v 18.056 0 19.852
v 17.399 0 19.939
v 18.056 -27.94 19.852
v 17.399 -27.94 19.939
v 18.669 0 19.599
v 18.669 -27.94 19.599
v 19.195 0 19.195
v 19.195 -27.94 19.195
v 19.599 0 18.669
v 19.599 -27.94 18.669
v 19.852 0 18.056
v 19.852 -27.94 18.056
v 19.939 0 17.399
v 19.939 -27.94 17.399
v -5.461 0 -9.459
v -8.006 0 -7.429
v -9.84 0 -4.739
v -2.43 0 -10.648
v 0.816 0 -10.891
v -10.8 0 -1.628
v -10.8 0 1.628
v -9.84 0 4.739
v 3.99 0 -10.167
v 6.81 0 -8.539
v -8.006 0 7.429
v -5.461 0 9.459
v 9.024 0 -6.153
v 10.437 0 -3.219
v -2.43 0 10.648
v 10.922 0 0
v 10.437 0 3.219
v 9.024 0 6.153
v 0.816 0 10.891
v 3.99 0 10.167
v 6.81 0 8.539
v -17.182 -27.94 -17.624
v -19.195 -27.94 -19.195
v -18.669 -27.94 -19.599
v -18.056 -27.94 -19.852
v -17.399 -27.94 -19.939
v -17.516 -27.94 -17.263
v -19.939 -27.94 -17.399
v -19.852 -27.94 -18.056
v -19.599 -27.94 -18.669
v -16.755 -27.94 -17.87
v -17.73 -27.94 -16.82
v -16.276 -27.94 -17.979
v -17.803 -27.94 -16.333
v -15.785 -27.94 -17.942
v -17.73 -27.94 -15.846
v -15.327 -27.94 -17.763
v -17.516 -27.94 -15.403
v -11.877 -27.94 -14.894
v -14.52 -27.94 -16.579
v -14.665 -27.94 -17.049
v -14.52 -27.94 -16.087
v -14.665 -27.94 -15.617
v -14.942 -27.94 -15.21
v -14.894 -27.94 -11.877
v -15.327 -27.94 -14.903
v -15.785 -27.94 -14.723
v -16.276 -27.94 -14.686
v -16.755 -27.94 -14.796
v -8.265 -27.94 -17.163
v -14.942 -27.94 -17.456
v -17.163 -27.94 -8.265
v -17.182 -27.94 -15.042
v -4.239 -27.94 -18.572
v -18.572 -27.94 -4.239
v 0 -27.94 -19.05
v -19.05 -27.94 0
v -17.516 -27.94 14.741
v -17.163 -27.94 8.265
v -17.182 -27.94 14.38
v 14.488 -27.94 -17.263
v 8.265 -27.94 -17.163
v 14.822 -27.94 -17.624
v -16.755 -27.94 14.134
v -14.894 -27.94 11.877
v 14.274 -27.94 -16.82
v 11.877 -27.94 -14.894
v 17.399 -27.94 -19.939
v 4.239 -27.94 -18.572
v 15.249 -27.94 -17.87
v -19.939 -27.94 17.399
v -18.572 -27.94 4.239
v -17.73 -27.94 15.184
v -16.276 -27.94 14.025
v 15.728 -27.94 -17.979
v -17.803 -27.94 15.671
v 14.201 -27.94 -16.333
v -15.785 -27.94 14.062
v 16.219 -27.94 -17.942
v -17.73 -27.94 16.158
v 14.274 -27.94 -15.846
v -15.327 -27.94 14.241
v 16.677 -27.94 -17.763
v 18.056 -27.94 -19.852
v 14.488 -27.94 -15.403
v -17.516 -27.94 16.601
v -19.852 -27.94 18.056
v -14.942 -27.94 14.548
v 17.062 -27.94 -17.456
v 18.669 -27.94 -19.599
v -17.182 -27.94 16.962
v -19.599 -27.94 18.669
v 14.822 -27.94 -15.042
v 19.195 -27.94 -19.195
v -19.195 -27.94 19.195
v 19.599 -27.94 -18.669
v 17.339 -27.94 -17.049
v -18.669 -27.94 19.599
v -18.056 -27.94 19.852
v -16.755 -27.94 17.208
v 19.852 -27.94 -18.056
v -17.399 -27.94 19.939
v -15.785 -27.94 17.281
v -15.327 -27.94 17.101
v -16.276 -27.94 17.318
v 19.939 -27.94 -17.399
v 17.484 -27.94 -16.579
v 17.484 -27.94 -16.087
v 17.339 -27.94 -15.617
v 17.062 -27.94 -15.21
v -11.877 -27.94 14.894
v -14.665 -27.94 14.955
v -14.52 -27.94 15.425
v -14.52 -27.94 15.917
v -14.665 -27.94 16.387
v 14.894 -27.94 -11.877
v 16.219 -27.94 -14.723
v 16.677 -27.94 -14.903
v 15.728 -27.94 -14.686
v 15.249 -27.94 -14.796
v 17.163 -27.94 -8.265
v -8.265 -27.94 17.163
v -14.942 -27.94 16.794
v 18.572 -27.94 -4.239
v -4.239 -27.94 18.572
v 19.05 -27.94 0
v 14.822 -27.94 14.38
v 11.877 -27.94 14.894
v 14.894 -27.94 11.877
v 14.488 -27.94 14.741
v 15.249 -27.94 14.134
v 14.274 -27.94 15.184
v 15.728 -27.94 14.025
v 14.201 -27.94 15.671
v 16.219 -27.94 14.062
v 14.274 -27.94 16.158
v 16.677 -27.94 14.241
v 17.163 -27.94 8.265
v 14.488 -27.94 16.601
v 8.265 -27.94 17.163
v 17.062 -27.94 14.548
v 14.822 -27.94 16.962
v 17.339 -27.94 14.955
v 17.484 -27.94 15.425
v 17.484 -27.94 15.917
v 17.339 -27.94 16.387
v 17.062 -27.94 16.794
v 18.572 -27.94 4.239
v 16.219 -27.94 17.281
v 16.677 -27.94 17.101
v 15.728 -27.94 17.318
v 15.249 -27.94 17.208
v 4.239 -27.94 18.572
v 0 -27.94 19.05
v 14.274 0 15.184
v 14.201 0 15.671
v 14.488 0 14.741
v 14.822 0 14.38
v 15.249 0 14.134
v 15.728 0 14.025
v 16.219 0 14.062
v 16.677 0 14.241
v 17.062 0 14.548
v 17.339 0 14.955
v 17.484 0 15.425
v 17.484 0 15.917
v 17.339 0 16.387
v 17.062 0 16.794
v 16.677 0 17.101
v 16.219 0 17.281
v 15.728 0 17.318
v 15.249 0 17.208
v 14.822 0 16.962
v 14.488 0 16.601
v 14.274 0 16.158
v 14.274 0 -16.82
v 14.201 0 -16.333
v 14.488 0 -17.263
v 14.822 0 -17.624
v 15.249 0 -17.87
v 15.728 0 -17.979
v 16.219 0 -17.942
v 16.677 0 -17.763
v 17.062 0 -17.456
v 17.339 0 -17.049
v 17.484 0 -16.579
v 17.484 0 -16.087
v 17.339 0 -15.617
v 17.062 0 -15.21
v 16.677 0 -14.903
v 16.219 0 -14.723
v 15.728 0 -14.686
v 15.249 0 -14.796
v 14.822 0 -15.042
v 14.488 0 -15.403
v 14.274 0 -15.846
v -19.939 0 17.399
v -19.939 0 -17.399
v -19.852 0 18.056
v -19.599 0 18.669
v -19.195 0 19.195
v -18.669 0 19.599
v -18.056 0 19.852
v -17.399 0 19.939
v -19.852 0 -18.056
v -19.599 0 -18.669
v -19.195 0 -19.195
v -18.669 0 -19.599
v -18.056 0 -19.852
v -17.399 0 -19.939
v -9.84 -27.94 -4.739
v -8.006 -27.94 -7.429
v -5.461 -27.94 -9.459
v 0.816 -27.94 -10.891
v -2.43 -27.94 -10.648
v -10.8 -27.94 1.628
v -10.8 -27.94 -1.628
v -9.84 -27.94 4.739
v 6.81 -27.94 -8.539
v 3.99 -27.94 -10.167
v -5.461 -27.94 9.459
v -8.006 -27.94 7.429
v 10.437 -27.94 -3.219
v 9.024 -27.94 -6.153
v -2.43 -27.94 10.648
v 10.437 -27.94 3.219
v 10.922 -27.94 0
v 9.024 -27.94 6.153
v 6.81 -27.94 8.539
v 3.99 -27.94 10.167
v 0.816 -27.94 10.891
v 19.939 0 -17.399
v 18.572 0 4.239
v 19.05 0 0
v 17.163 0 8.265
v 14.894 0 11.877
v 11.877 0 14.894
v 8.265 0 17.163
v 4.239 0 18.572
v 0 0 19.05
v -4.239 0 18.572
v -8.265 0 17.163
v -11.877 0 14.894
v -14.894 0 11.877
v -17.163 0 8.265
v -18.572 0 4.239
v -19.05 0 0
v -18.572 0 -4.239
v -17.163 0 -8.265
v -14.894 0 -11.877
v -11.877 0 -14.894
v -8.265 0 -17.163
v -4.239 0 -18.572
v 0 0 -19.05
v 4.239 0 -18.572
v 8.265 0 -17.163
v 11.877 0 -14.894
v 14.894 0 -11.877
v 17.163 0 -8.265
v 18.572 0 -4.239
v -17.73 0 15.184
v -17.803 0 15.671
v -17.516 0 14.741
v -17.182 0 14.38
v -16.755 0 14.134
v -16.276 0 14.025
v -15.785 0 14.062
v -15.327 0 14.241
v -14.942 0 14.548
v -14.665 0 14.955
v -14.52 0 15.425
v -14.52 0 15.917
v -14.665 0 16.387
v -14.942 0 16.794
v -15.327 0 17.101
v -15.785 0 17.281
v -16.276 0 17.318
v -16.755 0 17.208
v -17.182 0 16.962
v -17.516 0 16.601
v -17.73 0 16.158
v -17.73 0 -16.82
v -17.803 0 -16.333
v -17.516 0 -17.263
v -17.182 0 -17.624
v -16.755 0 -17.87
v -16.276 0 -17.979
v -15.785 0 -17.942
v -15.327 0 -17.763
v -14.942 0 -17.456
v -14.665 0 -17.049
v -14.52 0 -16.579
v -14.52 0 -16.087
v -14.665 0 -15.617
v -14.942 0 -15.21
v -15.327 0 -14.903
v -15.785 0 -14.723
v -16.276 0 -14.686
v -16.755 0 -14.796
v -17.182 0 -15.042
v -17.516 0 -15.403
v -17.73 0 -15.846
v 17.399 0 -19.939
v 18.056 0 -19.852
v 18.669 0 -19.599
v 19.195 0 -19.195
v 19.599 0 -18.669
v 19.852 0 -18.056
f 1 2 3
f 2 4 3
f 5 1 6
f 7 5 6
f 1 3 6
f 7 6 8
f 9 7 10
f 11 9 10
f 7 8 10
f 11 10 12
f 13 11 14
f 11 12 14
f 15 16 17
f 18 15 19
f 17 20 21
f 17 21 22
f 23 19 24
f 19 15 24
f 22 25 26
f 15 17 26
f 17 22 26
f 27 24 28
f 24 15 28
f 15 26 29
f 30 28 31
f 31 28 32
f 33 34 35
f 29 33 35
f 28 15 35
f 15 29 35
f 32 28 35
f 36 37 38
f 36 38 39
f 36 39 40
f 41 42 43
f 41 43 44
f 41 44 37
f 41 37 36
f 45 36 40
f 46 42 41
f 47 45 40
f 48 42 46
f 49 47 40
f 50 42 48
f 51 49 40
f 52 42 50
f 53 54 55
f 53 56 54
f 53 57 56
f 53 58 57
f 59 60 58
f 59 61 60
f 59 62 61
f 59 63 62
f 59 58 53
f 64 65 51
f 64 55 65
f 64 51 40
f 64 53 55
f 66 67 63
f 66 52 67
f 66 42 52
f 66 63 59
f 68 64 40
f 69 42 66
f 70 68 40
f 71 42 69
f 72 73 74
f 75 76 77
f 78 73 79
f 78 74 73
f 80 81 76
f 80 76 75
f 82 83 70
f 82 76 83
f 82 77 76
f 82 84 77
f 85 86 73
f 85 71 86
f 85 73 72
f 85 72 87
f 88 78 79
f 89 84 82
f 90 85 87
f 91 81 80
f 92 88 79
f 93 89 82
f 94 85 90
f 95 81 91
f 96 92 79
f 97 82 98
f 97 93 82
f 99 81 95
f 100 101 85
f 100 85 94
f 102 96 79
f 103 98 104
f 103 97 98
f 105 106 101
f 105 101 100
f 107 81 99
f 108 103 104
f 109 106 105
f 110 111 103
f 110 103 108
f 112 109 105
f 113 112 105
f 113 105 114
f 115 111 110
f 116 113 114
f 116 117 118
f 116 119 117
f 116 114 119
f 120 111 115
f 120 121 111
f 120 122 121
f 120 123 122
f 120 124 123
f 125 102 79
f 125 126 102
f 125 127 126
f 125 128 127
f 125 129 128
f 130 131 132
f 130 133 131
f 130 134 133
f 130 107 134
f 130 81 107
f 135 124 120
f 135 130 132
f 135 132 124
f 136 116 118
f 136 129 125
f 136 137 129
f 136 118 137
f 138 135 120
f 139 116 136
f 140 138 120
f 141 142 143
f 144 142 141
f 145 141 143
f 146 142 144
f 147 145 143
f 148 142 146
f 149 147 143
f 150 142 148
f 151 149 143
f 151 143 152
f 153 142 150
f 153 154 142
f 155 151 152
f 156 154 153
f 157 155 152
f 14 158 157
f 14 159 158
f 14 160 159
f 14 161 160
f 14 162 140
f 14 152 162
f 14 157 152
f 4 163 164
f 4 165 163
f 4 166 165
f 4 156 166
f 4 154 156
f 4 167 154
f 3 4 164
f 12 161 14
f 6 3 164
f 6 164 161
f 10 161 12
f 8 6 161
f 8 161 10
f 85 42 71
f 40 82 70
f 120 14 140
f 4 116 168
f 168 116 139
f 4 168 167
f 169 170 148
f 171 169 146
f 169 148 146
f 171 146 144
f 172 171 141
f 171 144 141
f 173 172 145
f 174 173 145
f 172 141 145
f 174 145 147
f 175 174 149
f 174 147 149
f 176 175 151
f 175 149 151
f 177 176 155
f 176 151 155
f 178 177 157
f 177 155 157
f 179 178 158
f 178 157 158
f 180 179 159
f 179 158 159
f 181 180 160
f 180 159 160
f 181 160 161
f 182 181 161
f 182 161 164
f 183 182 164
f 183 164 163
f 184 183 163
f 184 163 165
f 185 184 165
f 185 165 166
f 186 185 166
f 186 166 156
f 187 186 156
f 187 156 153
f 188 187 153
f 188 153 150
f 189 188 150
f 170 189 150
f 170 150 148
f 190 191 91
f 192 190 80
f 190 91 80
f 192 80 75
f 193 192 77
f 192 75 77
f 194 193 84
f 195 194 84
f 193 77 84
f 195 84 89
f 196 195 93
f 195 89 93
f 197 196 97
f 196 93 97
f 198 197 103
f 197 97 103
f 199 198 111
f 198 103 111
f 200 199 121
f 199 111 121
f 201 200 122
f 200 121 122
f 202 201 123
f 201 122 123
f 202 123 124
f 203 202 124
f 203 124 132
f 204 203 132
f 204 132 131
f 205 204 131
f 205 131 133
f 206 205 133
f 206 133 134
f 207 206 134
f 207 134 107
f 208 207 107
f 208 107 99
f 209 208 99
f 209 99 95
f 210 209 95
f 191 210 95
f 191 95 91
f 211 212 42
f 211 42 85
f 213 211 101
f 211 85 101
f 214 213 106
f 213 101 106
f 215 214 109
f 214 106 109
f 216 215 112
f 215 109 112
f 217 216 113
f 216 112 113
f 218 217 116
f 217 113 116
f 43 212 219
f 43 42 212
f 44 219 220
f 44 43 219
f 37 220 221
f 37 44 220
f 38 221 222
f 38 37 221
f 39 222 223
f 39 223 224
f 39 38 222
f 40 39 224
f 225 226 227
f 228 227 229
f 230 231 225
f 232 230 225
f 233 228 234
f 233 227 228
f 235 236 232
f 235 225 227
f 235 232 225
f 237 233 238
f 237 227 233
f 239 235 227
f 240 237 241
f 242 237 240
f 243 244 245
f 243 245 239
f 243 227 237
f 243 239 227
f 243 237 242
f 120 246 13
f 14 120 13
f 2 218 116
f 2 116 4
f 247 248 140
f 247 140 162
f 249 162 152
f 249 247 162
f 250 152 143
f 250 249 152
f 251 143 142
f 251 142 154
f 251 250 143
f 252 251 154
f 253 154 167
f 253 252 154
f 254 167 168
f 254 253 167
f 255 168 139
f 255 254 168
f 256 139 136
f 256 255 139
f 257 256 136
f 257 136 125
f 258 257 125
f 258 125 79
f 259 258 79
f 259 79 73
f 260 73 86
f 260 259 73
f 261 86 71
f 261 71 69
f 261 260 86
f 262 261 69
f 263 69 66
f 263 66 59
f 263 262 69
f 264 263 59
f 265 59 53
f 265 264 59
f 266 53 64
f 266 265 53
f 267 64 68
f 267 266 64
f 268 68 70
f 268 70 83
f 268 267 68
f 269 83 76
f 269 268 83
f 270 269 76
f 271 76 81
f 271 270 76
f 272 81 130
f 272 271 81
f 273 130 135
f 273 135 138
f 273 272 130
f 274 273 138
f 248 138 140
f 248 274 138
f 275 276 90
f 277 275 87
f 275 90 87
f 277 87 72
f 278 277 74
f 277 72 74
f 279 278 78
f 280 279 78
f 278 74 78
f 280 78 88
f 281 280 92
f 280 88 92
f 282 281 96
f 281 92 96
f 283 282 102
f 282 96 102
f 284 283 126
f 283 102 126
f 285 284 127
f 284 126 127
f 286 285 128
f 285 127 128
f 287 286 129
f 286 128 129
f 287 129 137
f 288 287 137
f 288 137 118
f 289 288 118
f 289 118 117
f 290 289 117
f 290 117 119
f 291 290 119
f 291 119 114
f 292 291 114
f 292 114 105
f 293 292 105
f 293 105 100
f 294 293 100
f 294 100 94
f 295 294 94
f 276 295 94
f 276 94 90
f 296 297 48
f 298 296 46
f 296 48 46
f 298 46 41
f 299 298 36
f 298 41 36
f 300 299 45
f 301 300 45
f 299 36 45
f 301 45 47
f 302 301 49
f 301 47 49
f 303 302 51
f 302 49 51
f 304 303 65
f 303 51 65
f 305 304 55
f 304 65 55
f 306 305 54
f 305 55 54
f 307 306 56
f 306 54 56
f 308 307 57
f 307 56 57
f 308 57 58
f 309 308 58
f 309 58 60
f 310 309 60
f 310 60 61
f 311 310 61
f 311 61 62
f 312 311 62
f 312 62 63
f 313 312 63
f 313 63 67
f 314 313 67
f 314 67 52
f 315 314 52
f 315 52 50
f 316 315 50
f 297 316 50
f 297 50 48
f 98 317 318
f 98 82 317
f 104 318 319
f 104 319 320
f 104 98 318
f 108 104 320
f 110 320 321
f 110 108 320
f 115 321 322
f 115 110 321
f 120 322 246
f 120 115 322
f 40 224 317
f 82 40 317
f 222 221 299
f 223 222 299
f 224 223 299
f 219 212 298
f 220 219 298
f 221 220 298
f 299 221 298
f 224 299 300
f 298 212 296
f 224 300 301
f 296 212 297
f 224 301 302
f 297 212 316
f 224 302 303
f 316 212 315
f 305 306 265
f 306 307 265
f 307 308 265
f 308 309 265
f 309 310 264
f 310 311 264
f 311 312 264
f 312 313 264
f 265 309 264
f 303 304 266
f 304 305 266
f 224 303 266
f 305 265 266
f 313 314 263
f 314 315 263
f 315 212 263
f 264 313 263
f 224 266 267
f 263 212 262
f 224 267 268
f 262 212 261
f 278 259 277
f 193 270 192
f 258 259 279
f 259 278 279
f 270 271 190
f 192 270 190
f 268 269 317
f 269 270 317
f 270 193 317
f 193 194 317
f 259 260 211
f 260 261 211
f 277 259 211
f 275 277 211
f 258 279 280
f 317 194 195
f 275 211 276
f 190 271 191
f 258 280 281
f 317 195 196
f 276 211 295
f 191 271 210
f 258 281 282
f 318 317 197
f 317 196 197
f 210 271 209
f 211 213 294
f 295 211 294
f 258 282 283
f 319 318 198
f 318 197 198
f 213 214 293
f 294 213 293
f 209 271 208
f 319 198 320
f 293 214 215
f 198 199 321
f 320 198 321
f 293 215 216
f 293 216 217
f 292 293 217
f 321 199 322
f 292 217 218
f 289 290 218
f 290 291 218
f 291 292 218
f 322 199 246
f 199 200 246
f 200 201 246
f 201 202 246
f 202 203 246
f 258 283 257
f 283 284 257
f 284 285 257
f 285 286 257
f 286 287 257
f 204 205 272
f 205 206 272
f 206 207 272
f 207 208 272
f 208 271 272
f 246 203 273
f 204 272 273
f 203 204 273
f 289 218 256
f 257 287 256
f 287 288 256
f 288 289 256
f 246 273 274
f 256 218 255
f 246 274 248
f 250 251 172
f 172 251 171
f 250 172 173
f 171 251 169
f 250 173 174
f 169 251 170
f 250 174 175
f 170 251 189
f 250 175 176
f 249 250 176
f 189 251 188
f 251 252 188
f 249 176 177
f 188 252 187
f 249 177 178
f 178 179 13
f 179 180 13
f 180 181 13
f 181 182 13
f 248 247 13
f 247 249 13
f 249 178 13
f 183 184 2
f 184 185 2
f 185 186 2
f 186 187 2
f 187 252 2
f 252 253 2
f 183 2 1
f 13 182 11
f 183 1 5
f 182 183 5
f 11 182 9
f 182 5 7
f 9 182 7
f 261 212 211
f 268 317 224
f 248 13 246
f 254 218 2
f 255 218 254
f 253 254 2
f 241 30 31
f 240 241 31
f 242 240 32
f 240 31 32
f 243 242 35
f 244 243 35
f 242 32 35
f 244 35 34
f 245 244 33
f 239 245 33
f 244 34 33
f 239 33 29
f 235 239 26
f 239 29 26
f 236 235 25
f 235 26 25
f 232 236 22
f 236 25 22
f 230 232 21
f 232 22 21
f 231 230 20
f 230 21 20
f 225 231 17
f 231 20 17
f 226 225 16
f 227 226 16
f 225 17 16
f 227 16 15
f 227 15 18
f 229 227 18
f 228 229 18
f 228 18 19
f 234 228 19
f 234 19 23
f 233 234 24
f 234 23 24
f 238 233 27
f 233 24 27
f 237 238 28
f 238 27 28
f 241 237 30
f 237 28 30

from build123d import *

# Parameters (mm, degrees)
F0_W     = 39.878
F0_H     = 39.878
F0_R     = 19.05
F2_DEPTH = 27.94
F0_R_2   = 10.922
F3_D     = 3.302
F4_R     = 2.54


# Not quite as in the source:
# - a feature names something its author has since deleted; it is built from what else it names


with BuildPart() as f2:
    # F0 (on Front) → F2 (new body)
    with BuildSketch(Plane.XZ):
        Rectangle(F0_W, F0_H)
        Circle(F0_R, mode=Mode.SUBTRACT)
    extrude(amount=F2_DEPTH)

    # F3 (through all)
    with Locations(Plane(origin=(0, 0, 0), x_dir=(1, 0, 0), z_dir=(0, 1, 0))):
        with Locations((15.8517888446, 16.3328610361), (15.8517888446, -15.6711389639), (-16.1522111554, 16.3328610361), (-16.1522111554, -15.6711389639)):
            Hole(F3_D / 2)

    # F4
    f4_edges = [f2.edges().sort_by_distance(p)[0] for p in [
        (19.939, -13.97, 19.939),
        (-19.939, -13.97, 19.939),
        (-19.939, -13.97, -19.939),
        (19.939, -13.97, -19.939),
    ]]
    fillet(f4_edges, radius=F4_R)


with BuildPart() as f2b:
    # F0 (on Front) → F2, piece 2 (new body)
    with BuildSketch(Plane.XZ):
        Circle(F0_R_2)
    extrude(amount=F2_DEPTH)


solid = Compound([f2.part, f2b.part])
